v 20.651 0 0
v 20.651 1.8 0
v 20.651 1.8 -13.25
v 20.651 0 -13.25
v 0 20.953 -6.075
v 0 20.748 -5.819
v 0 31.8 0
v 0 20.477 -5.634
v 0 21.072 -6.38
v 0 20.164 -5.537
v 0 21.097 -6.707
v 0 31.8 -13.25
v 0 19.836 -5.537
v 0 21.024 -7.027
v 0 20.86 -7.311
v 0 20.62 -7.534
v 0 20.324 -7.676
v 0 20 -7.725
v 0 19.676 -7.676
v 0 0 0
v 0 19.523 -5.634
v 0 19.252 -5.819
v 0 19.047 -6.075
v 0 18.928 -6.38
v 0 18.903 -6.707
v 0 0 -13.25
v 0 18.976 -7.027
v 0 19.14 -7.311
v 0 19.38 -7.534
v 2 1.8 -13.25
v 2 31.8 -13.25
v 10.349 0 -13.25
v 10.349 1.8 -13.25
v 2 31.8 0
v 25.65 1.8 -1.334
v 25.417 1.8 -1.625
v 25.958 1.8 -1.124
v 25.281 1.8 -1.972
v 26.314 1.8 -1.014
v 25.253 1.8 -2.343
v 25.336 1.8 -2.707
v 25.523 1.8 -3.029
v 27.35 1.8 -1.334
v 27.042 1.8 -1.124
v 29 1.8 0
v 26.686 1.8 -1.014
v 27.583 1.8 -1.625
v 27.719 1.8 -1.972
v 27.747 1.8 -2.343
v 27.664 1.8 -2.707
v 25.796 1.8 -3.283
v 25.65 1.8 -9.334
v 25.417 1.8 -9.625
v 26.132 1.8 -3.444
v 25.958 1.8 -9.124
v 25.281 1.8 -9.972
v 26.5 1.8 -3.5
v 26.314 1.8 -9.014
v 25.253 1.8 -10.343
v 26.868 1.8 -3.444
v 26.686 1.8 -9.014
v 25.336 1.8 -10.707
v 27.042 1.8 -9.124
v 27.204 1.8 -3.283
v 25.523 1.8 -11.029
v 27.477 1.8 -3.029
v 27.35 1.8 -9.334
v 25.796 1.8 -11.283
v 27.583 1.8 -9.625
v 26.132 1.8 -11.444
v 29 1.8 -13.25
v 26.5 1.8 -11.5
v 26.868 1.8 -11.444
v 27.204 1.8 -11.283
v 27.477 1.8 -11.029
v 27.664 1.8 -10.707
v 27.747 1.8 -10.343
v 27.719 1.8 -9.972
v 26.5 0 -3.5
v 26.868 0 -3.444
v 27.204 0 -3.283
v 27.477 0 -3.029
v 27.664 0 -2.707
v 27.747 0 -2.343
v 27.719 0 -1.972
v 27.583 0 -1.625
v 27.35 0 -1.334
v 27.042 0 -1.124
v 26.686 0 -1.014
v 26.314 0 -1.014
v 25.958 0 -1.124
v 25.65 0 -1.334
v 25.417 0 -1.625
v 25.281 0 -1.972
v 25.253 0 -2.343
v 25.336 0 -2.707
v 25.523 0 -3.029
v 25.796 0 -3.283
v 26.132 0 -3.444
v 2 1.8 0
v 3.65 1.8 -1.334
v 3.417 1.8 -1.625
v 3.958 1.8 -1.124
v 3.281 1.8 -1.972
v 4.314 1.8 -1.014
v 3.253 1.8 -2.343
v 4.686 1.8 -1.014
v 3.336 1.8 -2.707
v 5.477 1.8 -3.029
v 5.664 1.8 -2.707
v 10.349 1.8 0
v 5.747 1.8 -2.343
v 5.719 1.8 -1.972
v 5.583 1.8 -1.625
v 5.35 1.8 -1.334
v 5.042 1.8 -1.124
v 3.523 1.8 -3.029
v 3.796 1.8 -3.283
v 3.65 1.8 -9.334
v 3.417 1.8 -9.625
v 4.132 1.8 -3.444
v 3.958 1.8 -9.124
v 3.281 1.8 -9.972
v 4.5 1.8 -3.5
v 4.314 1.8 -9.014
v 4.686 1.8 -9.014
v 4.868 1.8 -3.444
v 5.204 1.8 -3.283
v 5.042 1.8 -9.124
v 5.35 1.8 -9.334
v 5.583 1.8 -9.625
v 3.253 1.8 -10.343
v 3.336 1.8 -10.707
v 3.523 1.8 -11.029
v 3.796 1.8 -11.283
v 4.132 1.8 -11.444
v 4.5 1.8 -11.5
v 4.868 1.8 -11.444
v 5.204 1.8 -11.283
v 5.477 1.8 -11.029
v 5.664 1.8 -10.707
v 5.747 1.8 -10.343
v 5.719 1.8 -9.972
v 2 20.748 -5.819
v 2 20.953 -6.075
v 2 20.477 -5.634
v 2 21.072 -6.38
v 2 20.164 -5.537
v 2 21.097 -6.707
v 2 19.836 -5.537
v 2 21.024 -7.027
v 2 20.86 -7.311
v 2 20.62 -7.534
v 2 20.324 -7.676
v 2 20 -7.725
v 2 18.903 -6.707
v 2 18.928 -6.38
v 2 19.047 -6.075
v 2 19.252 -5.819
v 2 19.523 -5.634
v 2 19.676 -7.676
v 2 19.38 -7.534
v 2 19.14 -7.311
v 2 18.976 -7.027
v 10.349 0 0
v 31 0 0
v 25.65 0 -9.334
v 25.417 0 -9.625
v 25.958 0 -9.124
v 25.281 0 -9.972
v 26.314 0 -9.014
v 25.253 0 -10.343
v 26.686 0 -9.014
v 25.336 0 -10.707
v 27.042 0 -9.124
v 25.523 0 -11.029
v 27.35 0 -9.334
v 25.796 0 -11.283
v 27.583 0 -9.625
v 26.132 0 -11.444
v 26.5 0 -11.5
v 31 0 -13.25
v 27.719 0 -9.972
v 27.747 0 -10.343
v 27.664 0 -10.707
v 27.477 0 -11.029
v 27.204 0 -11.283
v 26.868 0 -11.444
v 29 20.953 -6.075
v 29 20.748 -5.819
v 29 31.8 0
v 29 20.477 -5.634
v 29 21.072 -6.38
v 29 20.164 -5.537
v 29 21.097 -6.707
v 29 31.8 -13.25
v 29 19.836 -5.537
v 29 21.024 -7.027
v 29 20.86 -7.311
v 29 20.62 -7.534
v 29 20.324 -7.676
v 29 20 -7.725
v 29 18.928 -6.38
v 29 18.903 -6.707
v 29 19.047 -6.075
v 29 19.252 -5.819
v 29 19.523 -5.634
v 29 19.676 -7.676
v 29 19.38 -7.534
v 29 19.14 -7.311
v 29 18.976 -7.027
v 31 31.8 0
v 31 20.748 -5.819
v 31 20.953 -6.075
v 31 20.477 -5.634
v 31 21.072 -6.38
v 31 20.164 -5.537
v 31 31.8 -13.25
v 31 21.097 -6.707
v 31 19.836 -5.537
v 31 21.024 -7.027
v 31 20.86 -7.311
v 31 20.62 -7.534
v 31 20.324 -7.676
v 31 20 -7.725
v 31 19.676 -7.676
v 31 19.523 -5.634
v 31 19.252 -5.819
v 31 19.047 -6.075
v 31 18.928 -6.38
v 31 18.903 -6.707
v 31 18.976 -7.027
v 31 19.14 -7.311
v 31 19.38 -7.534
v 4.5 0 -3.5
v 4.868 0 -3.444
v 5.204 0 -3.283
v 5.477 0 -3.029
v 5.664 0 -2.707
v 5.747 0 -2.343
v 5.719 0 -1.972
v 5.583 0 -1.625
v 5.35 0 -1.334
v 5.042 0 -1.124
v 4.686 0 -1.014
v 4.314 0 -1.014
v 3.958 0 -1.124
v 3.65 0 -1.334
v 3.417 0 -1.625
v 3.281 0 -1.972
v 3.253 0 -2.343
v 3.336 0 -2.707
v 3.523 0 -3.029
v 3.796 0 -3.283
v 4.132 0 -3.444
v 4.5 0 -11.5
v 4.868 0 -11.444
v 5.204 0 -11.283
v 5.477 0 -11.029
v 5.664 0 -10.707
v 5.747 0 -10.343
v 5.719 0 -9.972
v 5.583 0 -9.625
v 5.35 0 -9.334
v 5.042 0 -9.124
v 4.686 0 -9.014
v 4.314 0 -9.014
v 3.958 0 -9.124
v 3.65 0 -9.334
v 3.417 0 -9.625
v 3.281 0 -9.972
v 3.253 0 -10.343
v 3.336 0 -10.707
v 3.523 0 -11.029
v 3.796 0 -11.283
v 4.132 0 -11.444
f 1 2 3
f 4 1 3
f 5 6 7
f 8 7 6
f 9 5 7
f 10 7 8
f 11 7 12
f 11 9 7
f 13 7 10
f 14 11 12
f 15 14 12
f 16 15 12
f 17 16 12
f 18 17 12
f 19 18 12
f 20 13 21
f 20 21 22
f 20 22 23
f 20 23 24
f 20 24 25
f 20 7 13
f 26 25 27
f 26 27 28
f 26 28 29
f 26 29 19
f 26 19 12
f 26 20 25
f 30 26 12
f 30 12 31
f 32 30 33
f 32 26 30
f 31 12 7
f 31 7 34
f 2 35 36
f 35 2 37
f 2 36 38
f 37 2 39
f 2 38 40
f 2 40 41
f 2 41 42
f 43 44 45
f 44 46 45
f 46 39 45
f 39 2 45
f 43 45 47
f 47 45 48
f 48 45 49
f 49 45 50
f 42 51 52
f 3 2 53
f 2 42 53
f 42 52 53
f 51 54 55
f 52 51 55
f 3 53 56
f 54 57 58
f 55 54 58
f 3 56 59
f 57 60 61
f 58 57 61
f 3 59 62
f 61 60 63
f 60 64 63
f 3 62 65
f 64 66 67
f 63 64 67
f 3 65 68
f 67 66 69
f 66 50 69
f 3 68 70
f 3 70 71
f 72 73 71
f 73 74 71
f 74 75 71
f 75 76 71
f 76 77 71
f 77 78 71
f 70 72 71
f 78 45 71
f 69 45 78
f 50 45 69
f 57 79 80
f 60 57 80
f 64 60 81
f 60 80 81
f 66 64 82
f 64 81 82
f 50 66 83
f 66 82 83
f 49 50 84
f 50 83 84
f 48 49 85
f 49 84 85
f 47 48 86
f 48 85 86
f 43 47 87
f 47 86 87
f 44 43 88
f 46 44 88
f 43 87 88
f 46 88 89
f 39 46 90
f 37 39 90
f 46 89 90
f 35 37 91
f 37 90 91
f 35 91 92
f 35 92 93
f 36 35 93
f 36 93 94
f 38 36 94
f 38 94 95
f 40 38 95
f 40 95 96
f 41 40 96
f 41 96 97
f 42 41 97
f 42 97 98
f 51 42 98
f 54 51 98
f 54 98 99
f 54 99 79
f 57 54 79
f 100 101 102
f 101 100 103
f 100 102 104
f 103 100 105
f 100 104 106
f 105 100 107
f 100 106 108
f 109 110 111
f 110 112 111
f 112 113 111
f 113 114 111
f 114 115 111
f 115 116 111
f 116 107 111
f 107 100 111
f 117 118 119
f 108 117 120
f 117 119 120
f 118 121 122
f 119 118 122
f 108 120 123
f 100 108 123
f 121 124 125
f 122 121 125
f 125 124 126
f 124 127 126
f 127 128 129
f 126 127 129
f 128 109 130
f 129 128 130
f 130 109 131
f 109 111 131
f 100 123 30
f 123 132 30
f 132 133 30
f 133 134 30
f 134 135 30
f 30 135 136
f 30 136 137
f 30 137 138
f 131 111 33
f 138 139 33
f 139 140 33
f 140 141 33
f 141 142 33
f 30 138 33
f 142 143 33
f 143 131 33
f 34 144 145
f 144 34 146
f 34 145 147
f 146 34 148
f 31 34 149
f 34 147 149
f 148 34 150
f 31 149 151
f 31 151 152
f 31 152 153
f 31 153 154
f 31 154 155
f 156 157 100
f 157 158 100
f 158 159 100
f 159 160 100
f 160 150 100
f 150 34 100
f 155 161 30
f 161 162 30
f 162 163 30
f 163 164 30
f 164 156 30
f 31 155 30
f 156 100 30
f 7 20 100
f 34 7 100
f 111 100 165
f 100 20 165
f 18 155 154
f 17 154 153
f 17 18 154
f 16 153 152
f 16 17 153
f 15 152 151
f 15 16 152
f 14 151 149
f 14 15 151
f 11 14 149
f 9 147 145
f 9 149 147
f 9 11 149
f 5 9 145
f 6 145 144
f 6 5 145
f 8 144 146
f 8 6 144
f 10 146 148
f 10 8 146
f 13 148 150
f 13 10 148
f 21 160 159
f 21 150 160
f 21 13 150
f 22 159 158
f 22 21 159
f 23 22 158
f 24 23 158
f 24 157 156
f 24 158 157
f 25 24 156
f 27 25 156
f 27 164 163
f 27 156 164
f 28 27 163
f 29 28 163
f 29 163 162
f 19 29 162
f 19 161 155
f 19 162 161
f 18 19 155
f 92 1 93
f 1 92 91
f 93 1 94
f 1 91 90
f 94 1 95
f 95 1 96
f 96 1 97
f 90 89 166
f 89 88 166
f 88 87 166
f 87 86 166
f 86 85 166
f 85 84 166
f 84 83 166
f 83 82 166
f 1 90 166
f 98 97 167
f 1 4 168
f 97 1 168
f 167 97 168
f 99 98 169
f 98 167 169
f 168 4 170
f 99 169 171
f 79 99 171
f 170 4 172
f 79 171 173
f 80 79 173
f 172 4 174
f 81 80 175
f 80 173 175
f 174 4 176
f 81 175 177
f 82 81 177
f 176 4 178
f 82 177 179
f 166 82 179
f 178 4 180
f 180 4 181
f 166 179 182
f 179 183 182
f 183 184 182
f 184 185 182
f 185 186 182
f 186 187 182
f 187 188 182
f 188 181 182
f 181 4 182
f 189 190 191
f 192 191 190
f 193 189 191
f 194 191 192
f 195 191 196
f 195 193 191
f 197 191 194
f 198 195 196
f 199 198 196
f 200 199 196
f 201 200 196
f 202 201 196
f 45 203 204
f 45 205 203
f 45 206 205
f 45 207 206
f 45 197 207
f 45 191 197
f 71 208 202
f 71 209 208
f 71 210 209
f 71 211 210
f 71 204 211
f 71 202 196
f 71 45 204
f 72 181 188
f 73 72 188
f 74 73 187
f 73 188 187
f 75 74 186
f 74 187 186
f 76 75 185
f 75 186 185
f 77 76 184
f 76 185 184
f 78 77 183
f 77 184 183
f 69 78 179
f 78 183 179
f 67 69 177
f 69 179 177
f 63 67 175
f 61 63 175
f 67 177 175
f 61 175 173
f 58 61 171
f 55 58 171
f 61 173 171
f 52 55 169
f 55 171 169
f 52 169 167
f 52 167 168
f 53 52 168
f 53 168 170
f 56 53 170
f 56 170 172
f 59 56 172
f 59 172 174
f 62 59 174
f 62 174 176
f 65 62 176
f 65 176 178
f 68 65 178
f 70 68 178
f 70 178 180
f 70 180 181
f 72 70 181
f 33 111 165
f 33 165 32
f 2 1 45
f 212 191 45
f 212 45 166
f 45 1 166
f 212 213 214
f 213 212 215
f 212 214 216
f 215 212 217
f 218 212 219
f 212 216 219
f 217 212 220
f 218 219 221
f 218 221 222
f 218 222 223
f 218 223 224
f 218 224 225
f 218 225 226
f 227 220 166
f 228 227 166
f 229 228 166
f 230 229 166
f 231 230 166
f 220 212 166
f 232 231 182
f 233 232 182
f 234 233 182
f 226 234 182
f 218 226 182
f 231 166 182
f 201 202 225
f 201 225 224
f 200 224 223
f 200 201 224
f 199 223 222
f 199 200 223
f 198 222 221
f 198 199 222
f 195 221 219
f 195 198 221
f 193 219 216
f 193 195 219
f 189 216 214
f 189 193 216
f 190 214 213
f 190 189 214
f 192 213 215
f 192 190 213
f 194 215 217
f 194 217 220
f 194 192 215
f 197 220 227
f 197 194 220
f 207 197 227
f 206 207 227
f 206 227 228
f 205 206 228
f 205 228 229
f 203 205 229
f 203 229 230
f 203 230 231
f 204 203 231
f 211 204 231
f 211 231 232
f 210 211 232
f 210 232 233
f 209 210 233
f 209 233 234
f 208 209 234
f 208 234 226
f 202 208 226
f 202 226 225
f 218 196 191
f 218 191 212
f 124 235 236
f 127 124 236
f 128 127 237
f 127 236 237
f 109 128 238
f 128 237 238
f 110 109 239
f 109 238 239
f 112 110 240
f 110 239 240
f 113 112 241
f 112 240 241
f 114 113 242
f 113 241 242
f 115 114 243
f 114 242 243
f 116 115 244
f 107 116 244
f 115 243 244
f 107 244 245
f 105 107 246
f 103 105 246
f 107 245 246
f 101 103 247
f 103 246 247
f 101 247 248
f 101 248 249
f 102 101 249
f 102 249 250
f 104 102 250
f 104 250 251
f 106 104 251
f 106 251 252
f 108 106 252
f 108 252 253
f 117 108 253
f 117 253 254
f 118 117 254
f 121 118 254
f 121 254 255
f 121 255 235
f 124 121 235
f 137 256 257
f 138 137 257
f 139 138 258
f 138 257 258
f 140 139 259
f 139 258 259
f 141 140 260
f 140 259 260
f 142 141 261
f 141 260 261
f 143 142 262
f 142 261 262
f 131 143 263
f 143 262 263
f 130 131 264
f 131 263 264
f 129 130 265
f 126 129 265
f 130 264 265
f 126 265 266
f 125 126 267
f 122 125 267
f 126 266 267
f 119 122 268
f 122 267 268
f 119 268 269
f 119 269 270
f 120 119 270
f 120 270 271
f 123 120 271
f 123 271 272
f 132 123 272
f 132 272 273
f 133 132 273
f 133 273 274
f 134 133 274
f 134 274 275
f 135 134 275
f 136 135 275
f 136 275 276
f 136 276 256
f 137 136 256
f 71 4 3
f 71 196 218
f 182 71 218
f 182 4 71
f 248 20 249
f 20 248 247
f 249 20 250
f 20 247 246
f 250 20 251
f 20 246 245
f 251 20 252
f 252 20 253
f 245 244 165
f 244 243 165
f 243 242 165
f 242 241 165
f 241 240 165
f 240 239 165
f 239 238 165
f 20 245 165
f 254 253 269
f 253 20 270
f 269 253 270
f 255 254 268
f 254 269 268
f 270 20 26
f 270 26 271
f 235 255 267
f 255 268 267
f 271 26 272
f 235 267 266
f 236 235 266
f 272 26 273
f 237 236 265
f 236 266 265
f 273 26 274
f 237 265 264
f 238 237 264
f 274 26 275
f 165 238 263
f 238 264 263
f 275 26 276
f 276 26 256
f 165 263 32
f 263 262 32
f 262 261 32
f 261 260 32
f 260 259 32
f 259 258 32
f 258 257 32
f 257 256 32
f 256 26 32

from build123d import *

# Parameters (mm, degrees)
SKETCH1_W             = 31
SKETCH1_H             = 13.25
SKETCH1_R             = 1.25
BOSS_EXTRUDE1_DEPTH   = 1.8
SKETCH4_R             = 1.25
BOSS_EXTRUDE2_DEPTH   = 5
BOSS_EXTRUDE2_2_DEPTH = 5
BOSS_EXTRUDE2_3_DEPTH = 5
BOSS_EXTRUDE2_4_DEPTH = 5
SKETCH4_4_R           = 1.25
BOSS_EXTRUDE4_DEPTH   = 1.8
SKETCH2_W             = 2
SKETCH2_H             = 13.25
BOSS_EXTRUDE5_DEPTH   = 30
SKETCH6_W             = 10.301582584
SKETCH6_H             = 13.25
CUT_EXTRUDE1_DEPTH    = 1.8
CUT_EXTRUDE2_START    = -31
SKETCH7_R             = 1.1
CUT_EXTRUDE2_DEPTH    = 31
SKETCH4_5_R           = 1.25
CUT_EXTRUDE3_DEPTH    = 10


with BuildPart() as part:
    # Sketch1 → Boss-Extrude1 (new body)
    with BuildSketch(Plane(origin=(0, 0, 0), x_dir=(1, 0, 0), z_dir=(0, 1, 0))):
        with Locations((15.5, 6.625)):
            Rectangle(SKETCH1_W, SKETCH1_H)
        with Locations(Location((4.5, 2.25, 0), (0, 0, 270))):
            Circle(SKETCH1_R, mode=Mode.SUBTRACT)
        with Locations(Location((26.5, 2.25, 0), (0, 0, 270))):
            Circle(SKETCH1_R, mode=Mode.SUBTRACT)
        with Locations(Location((26.5, 10.25, 0), (0, 0, 90))):
            Circle(SKETCH1_R, mode=Mode.SUBTRACT)
        with Locations(Location((4.5, 10.25, 0), (0, 0, 90))):
            Circle(SKETCH1_R, mode=Mode.SUBTRACT)
    extrude(amount=BOSS_EXTRUDE1_DEPTH)



with BuildPart() as body_2:
    # Sketch4 → Boss-Extrude2 (new body)
    with BuildSketch(Plane.XZ):
        with Locations(Location((4.5, -2.25, 0), (0, 0, 90))):
            Circle(SKETCH4_R)
    extrude(amount=BOSS_EXTRUDE2_DEPTH)


with BuildPart() as body_3:
    # Sketch4 → Boss-Extrude2 2 (new body)
    with BuildSketch(Plane.XZ):
        with Locations(Location((26.5, -2.25, 0), (0, 0, 90))):
            Circle(SKETCH4_R)
    extrude(amount=BOSS_EXTRUDE2_2_DEPTH)


with BuildPart() as body_4:
    # Sketch4 → Boss-Extrude2 3 (new body)
    with BuildSketch(Plane.XZ):
        with Locations(Location((26.5, -10.25, 0), (0, 0, 270))):
            Circle(SKETCH4_R)
    extrude(amount=BOSS_EXTRUDE2_3_DEPTH)


with BuildPart() as body_5:
    # Sketch4 → Boss-Extrude2 4 (new body)
    with BuildSketch(Plane.XZ):
        with Locations(Location((4.5, -10.25, 0), (0, 0, 270))):
            Circle(SKETCH4_R)
    extrude(amount=BOSS_EXTRUDE2_4_DEPTH)


with BuildPart() as part_1:
    add(part.part)

    add(body_2.part)  # Boss-Extrude4 merges body 2

    add(body_3.part)  # Boss-Extrude4 merges body 3

    add(body_4.part)  # Boss-Extrude4 merges body 4

    add(body_5.part)  # Boss-Extrude4 merges body 5
    # Sketch4<4> → Boss-Extrude4 (add)
    with BuildSketch(Plane.XZ):
        with Locations(Location((4.5, -2.25, 0), (0, 0, 270))):
            Circle(SKETCH4_4_R)
        with Locations(Location((26.5, -2.25, 0), (0, 0, 270))):
            Circle(SKETCH4_4_R)
        with Locations(Location((26.5, -10.25, 0), (0, 0, 270))):
            Circle(SKETCH4_4_R)
        with Locations(Location((4.5, -10.25, 0), (0, 0, 270))):
            Circle(SKETCH4_4_R)
    extrude(amount=-BOSS_EXTRUDE4_DEPTH)

    # Sketch2 → Boss-Extrude5 (add)
    with BuildSketch(Plane(origin=(0, 1.8, 0), x_dir=(1, 0, 0), z_dir=(0, 1, 0))):
        with Locations((1, 6.625)):
            Rectangle(SKETCH2_W, SKETCH2_H)
        with Locations((30, 6.625)):
            Rectangle(SKETCH2_W, SKETCH2_H)
    extrude(amount=BOSS_EXTRUDE5_DEPTH)

    # Sketch6 → Cut-Extrude1 (cut)
    with BuildSketch(Plane(origin=(0, 1.8, 0), x_dir=(1, 0, 0), z_dir=(0, 1, 0))):
        with Locations((15.5, 6.625)):
            Rectangle(SKETCH6_W, SKETCH6_H)
    extrude(amount=-CUT_EXTRUDE1_DEPTH, mode=Mode.SUBTRACT)


with BuildPart() as cut_extrude1_piece_1:
    # of the separate pieces the step leaves, piece 1, a body of its own (cut_extrude1_pieces)
    add(part_1.part.solids().sort_by_distance((0, 31.8, 0))[0])


with BuildPart() as cut_extrude1_piece_2:
    # of the separate pieces the step leaves, piece 2, a body of its own (cut_extrude1_pieces)
    add(part_1.part.solids().sort_by_distance((20.650791292, 0, 0))[0])


with BuildPart() as cut_extrude2_tool:
    # Sketch7 → Cut-Extrude2 (new body)
    with BuildSketch(Plane(origin=(31, 0, 0), x_dir=(0, 0, -1), z_dir=(1, 0, 0)).offset(CUT_EXTRUDE2_START)):
        with Locations((6.625, 20)):
            Circle(SKETCH7_R)
    extrude(amount=CUT_EXTRUDE2_DEPTH)


with BuildPart() as cut_extrude1_piece_1_1:
    add(cut_extrude1_piece_1.part)

    # Cut-Extrude2: cut by cut_extrude2_tool
    add(cut_extrude2_tool.part, mode=Mode.SUBTRACT)


with BuildPart() as cut_extrude1_piece_2_1:
    add(cut_extrude1_piece_2.part)

    # Cut-Extrude2: cut by cut_extrude2_tool
    add(cut_extrude2_tool.part, mode=Mode.SUBTRACT)


with BuildPart() as cut_extrude3_tool:
    # Sketch4<5> → Cut-Extrude3 (new body)
    with BuildSketch(Plane.XZ):
        with Locations(Location((4.5, -2.25, 0), (0, 0, 270))):
            Circle(SKETCH4_5_R)
        with Locations(Location((26.5, -2.25, 0), (0, 0, 270))):
            Circle(SKETCH4_5_R)
        with Locations(Location((26.5, -10.25, 0), (0, 0, 270))):
            Circle(SKETCH4_5_R)
        with Locations(Location((4.5, -10.25, 0), (0, 0, 270))):
            Circle(SKETCH4_5_R)
    extrude(amount=-CUT_EXTRUDE3_DEPTH)


with BuildPart() as cut_extrude1_piece_1_2:
    add(cut_extrude1_piece_1_1.part)

    # Cut-Extrude3: cut by cut_extrude3_tool
    add(cut_extrude3_tool.part, mode=Mode.SUBTRACT)


with BuildPart() as cut_extrude1_piece_2_2:
    add(cut_extrude1_piece_2_1.part)

    # Cut-Extrude3: cut by cut_extrude3_tool
    add(cut_extrude3_tool.part, mode=Mode.SUBTRACT)


with BuildPart() as cut_extrude3_piece_1:
    # of the separate pieces the step leaves, piece 1, a body of its own (cut_extrude3_pieces)
    add(cut_extrude1_piece_1_2.part.solids().sort_by_distance((0, 31.8, 0))[0])


with BuildPart() as cut_extrude3_piece_2:
    # of the separate pieces the step leaves, piece 2, a body of its own (cut_extrude3_pieces)
    add(cut_extrude1_piece_1_2.part.solids().sort_by_distance((4.5, -5, -11.5))[0])


with BuildPart() as cut_extrude3_piece_3:
    # of the separate pieces the step leaves, piece 3, a body of its own (cut_extrude3_pieces)
    add(cut_extrude1_piece_1_2.part.solids().sort_by_distance((4.5, -5, -1))[0])


with BuildPart() as cut_extrude3_piece_1_of_cut_extrude1_pie:
    # of the separate pieces the step leaves, piece 1, a body of its own (cut_extrude3_pieces_of_cut_extrude1_piec)
    add(cut_extrude1_piece_2_2.part.solids().sort_by_distance((20.650791292, 0, 0))[0])


with BuildPart() as cut_extrude3_piece_2_of_cut_extrude1_pie:
    # of the separate pieces the step leaves, piece 2, a body of its own (cut_extrude3_pieces_of_cut_extrude1_piec)
    add(cut_extrude1_piece_2_2.part.solids().sort_by_distance((26.5, -5, -11.5))[0])


with BuildPart() as cut_extrude3_piece_3_of_cut_extrude1_pie:
    # of the separate pieces the step leaves, piece 3, a body of its own (cut_extrude3_pieces_of_cut_extrude1_piec)
    add(cut_extrude1_piece_2_2.part.solids().sort_by_distance((26.5, -5, -1))[0])


solid = Compound([cut_extrude3_piece_1.part, cut_extrude3_piece_1_of_cut_extrude1_pie.part])
